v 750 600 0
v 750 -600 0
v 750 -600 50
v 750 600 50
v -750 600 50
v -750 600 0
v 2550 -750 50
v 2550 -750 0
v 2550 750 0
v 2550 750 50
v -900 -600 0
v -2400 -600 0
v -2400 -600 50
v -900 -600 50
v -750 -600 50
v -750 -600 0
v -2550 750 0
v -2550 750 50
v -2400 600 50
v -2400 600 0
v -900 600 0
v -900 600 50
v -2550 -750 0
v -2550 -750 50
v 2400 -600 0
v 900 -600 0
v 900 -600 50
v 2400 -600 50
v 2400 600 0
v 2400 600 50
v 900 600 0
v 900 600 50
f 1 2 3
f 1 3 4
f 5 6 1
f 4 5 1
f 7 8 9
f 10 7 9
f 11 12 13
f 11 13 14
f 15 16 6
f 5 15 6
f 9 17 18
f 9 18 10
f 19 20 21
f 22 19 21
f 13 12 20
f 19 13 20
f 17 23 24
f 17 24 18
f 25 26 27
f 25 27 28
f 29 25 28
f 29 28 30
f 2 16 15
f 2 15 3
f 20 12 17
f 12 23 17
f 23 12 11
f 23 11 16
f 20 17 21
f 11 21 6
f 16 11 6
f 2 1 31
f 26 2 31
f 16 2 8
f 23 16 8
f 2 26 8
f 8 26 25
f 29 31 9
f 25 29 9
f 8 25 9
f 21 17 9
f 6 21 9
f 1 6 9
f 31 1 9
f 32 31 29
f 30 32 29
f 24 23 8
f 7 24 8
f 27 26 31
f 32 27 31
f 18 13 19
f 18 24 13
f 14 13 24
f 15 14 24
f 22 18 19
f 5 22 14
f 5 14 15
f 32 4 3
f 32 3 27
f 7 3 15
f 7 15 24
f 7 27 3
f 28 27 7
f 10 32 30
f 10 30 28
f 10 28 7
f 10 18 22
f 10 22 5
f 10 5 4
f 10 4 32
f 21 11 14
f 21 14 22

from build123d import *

# Parameters (mm, degrees)
SKETCH1_W           = 5100
SKETCH1_H           = 1500
SKETCH1_W_2         = 1500
SKETCH1_H_2         = 1200
BOSS_EXTRUDE1_DEPTH = 50


with BuildPart() as part:
    # Sketch1 → Boss-Extrude1 (new body)
    with BuildSketch(Plane.XY):
        Rectangle(SKETCH1_W, SKETCH1_H)
        with Locations((1650, 0)):
            Rectangle(SKETCH1_W_2, SKETCH1_H_2, mode=Mode.SUBTRACT)
        with Locations((-1650, 0)):
            Rectangle(SKETCH1_W_2, SKETCH1_H_2, mode=Mode.SUBTRACT)
        Rectangle(SKETCH1_W_2, SKETCH1_H_2, mode=Mode.SUBTRACT)
    extrude(amount=BOSS_EXTRUDE1_DEPTH)


solid = part.part
